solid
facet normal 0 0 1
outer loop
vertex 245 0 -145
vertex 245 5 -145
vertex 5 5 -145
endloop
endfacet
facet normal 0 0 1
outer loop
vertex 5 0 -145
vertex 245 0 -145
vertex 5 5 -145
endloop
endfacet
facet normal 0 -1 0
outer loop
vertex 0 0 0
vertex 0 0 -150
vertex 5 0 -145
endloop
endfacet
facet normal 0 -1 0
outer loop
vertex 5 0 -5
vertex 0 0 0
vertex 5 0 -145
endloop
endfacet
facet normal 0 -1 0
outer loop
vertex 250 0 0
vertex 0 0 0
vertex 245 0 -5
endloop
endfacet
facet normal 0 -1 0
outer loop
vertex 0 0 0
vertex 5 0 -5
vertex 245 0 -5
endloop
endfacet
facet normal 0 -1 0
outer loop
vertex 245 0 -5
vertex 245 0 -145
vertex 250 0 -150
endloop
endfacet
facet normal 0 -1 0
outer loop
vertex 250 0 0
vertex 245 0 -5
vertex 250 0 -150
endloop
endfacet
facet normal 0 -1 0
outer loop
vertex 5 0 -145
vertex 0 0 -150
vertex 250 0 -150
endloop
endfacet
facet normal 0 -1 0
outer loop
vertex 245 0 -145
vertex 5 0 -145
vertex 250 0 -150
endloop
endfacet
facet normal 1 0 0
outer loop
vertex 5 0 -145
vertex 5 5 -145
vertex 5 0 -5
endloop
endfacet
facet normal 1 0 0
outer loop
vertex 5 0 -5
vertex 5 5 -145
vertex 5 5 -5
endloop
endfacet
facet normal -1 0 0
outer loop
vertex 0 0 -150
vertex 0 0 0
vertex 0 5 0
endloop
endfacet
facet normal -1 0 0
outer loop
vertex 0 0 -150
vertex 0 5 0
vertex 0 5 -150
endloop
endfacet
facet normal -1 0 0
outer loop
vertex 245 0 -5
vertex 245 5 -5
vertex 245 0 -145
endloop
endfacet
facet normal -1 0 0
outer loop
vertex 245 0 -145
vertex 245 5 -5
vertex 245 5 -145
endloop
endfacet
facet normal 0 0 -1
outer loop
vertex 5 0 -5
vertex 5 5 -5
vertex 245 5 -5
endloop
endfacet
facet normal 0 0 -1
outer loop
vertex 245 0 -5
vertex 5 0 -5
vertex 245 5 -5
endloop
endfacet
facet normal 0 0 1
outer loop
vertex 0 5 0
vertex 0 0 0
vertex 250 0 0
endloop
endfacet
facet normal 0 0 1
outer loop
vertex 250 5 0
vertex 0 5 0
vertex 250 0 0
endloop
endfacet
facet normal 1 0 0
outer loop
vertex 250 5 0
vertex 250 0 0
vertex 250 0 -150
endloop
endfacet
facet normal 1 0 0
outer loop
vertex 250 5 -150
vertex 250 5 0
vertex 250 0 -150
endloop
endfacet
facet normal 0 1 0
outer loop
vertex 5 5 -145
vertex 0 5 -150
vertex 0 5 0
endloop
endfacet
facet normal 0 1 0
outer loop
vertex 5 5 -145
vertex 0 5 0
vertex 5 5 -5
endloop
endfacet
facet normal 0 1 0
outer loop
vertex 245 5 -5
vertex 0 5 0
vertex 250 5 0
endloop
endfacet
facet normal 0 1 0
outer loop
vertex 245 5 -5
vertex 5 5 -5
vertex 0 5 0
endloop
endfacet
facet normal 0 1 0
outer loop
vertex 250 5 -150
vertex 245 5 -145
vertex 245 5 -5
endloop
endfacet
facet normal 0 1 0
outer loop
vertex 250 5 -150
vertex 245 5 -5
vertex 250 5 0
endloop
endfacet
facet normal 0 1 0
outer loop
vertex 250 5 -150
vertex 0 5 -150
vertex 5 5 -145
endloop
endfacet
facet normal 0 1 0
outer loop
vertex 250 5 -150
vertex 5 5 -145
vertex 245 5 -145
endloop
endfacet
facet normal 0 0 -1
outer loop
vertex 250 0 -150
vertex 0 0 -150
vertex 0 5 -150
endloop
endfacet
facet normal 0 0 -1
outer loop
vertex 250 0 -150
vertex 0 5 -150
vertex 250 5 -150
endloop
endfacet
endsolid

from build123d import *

# Parameters (mm, degrees)
SKETCH1_W                                         = 250
SKETCH1_H                                         = 150
BOSS_EXTRUDE1_DEPTH                               = 5
CUT_EXTRUDE1_DEPTH                                = 5
CSK_FOR_8_FLAT_HEAD_MACHINE_SCREW_100_D           = 4.4958
CSK_FOR_8_FLAT_HEAD_MACHINE_SCREW_100_CSINK_D     = 8.4328
CSK_FOR_8_FLAT_HEAD_MACHINE_SCREW_100_CSINK_ANGLE = 100
SKETCH4_W                                         = 10
SKETCH4_H                                         = 12.954582158
CUT_EXTRUDE2_DEPTH                                = 10


with BuildPart() as part:
    # Sketch1 → Boss-Extrude1 (new body)
    with BuildSketch(Plane(origin=(0, 0, 0), x_dir=(1, 0, 0), z_dir=(0, 1, 0))):
        with Locations((125, 75)):
            Rectangle(SKETCH1_W, SKETCH1_H)
    extrude(amount=BOSS_EXTRUDE1_DEPTH)

    # Sketch2 → Cut-Extrude1 (cut)
    with BuildSketch(Plane(origin=(0, 5, 0), x_dir=(1, 0, 0), z_dir=(0, 1, 0))):
        Polygon((5, 5), (245, 5), (245, 68.522708921), (235, 68.522708921), (235, 81.477291079), (245, 81.477291079), (245, 145), (5, 145), align=None)
    extrude(amount=-CUT_EXTRUDE1_DEPTH, mode=Mode.SUBTRACT)

    # CSK for #8 Flat Head Machine Screw (100)1 (through all)
    with Locations(Plane(origin=(240.110859841, 5, -75.135992341), x_dir=(0, 0, 1), z_dir=(0, 1, 0))):
        with Locations((0, 0)):
            CounterSinkHole(CSK_FOR_8_FLAT_HEAD_MACHINE_SCREW_100_D / 2, CSK_FOR_8_FLAT_HEAD_MACHINE_SCREW_100_CSINK_D / 2, counter_sink_angle=CSK_FOR_8_FLAT_HEAD_MACHINE_SCREW_100_CSINK_ANGLE)

    # Sketch4 → Cut-Extrude2 (cut)
    with BuildSketch(Plane(origin=(0, 5, 0), x_dir=(1, 0, 0), z_dir=(0, 1, 0))):
        with Locations((240, 75)):
            Rectangle(SKETCH4_W, SKETCH4_H)
    extrude(amount=-CUT_EXTRUDE2_DEPTH, mode=Mode.SUBTRACT)


solid = part.part
